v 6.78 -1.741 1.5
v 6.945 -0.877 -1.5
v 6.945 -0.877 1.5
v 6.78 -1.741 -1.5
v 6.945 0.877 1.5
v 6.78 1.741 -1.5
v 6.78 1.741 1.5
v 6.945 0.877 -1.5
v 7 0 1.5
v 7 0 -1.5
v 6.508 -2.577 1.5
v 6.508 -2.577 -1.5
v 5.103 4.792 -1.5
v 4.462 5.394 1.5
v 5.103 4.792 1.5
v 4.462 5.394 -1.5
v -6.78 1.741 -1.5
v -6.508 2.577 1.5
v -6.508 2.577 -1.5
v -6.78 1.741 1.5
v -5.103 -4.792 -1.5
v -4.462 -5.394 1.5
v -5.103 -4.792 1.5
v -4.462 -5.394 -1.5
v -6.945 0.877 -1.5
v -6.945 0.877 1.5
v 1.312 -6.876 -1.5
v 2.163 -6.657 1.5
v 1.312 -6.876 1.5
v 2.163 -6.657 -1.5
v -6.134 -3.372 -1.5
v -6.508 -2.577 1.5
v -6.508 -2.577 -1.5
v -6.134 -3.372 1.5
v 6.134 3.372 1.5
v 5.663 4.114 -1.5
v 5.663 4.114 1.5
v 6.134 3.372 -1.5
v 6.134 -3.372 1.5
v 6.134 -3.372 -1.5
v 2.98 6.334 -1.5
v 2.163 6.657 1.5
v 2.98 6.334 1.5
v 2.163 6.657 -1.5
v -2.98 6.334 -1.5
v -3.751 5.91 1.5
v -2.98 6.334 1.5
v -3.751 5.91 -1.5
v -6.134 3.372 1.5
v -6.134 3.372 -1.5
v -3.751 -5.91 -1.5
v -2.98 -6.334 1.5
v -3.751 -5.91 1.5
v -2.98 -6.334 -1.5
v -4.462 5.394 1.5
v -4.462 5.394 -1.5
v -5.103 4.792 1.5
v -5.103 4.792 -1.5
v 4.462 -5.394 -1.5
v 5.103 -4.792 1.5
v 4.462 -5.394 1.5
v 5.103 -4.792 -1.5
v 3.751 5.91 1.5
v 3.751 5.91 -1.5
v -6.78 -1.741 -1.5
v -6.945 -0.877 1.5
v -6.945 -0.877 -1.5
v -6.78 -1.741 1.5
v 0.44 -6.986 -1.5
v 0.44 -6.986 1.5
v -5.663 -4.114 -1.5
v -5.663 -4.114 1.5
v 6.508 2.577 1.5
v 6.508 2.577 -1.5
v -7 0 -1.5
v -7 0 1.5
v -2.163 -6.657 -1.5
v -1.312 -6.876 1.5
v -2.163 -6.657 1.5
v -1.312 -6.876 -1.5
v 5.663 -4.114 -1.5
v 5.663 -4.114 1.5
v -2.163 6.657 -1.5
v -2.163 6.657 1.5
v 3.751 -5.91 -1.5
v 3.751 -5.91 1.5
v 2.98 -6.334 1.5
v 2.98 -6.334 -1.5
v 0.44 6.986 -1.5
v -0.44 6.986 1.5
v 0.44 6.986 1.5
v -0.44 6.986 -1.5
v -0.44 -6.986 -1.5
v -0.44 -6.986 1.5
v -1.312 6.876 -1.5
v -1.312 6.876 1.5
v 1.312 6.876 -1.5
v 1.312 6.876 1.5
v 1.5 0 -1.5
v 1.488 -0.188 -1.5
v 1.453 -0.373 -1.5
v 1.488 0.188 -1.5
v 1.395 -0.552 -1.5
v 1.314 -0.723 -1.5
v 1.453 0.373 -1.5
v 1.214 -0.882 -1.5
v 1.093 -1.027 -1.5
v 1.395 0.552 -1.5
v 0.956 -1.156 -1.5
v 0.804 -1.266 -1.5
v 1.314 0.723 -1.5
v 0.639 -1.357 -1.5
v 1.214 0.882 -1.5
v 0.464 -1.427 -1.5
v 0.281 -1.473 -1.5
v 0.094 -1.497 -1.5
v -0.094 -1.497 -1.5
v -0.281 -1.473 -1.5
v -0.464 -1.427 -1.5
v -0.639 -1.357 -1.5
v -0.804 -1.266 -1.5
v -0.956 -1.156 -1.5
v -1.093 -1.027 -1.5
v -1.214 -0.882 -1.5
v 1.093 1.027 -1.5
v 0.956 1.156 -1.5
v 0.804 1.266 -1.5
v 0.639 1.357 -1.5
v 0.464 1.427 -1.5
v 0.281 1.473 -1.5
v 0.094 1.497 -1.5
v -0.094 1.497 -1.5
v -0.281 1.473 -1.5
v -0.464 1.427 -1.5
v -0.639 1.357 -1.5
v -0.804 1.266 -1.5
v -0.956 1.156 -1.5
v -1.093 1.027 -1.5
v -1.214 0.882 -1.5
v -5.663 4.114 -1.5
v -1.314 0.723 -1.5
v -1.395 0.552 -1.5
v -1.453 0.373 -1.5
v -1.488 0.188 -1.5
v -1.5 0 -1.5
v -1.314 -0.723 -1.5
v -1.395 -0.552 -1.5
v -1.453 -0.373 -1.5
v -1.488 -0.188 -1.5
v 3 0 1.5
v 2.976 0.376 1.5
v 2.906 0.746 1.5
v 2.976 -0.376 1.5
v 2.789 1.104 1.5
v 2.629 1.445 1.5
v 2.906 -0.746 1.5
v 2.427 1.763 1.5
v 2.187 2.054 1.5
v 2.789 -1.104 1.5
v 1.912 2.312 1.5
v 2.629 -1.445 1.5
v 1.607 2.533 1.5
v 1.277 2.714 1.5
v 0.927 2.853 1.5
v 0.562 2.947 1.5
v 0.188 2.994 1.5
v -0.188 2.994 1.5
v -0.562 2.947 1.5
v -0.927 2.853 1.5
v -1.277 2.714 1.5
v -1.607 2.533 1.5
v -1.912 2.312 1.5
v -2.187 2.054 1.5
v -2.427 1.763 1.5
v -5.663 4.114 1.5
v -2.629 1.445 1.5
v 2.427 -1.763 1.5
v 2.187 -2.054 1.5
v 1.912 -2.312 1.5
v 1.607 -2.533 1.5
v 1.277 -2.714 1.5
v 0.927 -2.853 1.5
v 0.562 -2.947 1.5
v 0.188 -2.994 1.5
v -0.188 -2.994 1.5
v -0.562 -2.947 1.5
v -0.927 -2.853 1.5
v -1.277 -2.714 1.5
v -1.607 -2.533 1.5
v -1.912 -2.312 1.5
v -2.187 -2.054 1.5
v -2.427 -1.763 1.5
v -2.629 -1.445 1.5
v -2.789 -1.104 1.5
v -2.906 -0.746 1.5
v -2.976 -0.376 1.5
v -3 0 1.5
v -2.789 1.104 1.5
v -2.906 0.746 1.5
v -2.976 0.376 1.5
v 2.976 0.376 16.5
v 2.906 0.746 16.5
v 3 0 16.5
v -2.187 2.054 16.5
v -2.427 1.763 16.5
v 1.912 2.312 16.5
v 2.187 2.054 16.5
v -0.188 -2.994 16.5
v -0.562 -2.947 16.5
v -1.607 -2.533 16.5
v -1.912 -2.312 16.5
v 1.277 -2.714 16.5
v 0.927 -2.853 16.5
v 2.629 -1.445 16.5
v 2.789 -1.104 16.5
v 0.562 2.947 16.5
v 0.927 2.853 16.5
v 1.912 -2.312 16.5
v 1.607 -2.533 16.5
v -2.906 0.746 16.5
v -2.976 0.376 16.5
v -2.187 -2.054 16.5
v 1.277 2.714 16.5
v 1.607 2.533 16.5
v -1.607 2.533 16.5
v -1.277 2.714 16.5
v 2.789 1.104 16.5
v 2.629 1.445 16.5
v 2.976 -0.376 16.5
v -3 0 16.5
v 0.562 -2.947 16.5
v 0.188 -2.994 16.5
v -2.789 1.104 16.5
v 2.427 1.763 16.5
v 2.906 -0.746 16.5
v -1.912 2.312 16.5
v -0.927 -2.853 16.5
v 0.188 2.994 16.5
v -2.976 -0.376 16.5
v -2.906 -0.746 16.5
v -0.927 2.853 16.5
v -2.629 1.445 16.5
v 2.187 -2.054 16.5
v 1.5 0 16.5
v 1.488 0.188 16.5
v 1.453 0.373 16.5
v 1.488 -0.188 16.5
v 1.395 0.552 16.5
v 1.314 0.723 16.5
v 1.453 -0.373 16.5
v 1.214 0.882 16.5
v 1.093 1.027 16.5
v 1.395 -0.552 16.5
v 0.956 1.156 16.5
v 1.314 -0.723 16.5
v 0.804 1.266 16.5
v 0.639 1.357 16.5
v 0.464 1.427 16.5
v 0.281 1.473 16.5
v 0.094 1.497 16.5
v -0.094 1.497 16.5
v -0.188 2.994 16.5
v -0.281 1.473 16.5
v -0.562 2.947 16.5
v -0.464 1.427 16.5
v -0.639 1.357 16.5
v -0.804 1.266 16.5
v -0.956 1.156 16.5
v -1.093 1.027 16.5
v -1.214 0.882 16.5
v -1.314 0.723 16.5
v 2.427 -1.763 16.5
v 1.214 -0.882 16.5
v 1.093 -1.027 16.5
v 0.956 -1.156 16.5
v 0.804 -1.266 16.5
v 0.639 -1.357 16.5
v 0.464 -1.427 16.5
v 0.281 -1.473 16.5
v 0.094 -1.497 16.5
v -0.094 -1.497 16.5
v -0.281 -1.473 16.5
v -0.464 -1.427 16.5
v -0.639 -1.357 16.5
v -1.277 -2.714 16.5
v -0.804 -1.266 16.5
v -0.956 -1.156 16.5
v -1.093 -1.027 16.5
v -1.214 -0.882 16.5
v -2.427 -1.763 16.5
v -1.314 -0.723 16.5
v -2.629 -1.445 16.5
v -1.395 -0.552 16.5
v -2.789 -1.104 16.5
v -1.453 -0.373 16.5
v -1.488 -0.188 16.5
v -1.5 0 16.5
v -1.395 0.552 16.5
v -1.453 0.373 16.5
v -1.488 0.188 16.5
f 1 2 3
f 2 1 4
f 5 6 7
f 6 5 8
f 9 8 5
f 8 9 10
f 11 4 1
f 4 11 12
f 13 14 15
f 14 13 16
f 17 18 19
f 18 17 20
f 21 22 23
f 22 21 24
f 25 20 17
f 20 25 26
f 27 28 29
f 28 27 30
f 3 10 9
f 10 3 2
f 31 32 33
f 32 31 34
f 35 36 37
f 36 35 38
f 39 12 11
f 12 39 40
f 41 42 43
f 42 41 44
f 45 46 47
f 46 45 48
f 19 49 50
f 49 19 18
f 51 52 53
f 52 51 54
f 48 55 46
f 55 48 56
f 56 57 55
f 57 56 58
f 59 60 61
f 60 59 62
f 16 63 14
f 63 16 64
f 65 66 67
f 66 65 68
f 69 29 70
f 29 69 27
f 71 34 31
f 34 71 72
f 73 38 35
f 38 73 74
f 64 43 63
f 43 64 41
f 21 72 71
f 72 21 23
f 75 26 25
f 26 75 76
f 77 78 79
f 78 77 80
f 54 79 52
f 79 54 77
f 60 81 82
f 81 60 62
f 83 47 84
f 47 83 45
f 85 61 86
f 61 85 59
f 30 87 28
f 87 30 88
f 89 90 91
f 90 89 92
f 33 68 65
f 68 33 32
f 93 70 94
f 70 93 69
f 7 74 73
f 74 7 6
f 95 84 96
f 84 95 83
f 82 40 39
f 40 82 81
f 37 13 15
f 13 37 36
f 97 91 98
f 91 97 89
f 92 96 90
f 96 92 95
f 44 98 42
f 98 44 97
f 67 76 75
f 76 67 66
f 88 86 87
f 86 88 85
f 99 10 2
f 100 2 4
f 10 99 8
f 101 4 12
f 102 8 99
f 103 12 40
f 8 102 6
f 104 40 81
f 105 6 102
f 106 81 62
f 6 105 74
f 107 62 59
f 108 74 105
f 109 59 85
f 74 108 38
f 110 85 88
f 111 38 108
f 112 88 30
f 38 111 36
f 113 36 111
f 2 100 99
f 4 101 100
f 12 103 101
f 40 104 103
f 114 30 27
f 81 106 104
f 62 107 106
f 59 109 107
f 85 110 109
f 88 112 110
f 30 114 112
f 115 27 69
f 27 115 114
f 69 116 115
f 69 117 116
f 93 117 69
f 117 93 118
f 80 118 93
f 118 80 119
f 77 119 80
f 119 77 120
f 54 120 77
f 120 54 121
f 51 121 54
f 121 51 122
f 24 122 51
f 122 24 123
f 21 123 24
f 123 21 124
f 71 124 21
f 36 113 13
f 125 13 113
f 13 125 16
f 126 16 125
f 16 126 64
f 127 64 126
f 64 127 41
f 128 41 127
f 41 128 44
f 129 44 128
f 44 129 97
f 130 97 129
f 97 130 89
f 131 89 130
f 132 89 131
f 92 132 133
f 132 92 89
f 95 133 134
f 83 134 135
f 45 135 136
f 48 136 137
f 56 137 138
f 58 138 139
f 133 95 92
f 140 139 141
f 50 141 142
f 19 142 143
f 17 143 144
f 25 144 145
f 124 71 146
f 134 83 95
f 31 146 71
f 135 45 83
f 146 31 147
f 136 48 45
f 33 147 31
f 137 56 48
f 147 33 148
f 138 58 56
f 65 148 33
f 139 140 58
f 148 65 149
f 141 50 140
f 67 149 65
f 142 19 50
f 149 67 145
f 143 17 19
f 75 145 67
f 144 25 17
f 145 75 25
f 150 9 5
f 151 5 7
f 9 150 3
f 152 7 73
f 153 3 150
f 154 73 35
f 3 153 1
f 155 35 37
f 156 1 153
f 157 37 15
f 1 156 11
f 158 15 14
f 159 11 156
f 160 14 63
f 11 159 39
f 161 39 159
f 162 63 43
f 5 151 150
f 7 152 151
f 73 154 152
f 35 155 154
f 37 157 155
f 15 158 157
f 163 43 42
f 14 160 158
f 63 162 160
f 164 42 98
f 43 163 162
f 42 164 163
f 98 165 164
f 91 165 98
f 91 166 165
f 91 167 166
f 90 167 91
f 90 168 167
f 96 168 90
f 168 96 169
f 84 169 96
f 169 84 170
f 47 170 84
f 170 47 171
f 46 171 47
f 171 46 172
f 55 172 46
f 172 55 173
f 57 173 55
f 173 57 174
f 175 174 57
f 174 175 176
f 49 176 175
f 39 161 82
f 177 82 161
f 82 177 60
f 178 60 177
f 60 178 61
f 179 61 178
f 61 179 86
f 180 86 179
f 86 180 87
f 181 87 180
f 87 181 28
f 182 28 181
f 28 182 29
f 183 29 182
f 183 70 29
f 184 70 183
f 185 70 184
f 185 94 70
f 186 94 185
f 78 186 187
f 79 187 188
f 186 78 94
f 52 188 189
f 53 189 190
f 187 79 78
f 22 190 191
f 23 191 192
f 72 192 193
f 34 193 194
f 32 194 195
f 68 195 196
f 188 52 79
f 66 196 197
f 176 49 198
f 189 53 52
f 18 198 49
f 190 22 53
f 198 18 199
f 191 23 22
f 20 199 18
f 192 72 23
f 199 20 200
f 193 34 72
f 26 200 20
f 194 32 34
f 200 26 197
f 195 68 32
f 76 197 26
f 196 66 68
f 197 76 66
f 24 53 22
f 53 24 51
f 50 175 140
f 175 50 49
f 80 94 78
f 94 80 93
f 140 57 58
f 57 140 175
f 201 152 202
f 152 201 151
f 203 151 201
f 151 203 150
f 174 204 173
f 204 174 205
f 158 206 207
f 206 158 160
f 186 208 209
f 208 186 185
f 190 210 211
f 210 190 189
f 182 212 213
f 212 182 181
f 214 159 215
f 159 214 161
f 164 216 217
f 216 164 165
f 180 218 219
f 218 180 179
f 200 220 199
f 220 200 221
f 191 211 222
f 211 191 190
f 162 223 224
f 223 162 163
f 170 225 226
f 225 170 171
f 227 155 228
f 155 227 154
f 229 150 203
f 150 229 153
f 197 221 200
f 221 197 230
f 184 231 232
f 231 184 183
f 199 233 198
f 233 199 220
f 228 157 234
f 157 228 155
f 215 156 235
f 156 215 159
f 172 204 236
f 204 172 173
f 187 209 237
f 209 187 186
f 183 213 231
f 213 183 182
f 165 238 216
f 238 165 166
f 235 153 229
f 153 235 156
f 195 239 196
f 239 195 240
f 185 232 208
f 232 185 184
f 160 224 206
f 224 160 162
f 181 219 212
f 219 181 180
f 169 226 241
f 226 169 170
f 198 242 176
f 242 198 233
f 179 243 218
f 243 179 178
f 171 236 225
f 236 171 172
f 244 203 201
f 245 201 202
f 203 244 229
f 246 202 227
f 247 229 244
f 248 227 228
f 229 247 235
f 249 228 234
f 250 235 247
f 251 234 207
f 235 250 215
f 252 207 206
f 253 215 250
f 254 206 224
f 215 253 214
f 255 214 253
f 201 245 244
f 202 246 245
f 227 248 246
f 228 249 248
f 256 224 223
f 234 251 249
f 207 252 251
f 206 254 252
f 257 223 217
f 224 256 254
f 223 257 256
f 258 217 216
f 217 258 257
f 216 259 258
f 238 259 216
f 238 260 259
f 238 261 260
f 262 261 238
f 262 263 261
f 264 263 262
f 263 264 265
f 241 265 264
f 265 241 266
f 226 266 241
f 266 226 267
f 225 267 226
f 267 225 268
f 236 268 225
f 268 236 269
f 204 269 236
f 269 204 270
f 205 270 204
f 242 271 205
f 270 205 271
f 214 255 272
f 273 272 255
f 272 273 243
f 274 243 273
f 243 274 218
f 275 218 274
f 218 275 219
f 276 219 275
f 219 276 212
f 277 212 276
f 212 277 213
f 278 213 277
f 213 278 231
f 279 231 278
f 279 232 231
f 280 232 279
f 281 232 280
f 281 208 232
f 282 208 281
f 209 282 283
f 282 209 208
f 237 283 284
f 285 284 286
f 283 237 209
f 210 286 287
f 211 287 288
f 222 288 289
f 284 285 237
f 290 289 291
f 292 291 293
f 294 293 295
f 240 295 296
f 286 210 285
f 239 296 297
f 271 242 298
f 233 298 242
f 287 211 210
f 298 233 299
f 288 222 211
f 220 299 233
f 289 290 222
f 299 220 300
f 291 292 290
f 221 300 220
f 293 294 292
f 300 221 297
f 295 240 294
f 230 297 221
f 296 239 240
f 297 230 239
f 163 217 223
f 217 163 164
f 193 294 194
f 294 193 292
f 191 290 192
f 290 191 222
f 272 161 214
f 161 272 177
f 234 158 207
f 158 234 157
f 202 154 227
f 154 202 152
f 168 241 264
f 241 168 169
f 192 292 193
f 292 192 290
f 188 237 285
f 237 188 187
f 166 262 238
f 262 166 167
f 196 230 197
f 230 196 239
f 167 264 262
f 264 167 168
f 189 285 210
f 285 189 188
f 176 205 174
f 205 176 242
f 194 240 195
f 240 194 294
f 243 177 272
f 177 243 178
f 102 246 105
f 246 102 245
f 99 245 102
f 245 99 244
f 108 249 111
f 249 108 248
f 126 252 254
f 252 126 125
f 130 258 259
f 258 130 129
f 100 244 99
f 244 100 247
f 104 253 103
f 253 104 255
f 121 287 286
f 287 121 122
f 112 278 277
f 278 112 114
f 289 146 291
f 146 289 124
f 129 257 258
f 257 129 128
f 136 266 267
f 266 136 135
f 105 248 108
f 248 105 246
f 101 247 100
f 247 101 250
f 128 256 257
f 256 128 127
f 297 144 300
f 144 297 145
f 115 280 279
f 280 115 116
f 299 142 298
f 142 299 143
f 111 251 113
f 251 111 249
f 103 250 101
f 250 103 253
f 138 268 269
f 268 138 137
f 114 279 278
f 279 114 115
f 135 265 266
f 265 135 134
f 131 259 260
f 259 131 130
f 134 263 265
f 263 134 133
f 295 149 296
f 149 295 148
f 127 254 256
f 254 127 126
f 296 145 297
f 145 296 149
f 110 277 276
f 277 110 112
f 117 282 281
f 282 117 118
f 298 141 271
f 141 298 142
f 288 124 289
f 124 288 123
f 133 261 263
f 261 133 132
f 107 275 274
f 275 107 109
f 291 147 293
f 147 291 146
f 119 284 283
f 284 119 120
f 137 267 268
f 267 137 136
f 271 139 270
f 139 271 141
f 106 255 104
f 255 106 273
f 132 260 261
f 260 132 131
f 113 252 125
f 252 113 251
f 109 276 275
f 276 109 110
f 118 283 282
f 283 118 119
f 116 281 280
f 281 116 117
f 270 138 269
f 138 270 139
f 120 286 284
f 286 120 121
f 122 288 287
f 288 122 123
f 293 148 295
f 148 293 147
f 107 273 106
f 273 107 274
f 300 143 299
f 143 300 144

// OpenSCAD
$fn = 50;


difference() {
	union() {
		translate(v = [0, 0, -1.5000000000]) {
			cylinder(h = 3, r = 7.0000000000);
		}
		translate(v = [0, 0, -1.5000000000]) {
			cylinder(h = 18, r = 3.0000000000);
		}
	}
	union() {
		translate(v = [0, 0, -100.0000000000]) {
			cylinder(h = 200, r = 1.5000000000);
		}
	}
}
